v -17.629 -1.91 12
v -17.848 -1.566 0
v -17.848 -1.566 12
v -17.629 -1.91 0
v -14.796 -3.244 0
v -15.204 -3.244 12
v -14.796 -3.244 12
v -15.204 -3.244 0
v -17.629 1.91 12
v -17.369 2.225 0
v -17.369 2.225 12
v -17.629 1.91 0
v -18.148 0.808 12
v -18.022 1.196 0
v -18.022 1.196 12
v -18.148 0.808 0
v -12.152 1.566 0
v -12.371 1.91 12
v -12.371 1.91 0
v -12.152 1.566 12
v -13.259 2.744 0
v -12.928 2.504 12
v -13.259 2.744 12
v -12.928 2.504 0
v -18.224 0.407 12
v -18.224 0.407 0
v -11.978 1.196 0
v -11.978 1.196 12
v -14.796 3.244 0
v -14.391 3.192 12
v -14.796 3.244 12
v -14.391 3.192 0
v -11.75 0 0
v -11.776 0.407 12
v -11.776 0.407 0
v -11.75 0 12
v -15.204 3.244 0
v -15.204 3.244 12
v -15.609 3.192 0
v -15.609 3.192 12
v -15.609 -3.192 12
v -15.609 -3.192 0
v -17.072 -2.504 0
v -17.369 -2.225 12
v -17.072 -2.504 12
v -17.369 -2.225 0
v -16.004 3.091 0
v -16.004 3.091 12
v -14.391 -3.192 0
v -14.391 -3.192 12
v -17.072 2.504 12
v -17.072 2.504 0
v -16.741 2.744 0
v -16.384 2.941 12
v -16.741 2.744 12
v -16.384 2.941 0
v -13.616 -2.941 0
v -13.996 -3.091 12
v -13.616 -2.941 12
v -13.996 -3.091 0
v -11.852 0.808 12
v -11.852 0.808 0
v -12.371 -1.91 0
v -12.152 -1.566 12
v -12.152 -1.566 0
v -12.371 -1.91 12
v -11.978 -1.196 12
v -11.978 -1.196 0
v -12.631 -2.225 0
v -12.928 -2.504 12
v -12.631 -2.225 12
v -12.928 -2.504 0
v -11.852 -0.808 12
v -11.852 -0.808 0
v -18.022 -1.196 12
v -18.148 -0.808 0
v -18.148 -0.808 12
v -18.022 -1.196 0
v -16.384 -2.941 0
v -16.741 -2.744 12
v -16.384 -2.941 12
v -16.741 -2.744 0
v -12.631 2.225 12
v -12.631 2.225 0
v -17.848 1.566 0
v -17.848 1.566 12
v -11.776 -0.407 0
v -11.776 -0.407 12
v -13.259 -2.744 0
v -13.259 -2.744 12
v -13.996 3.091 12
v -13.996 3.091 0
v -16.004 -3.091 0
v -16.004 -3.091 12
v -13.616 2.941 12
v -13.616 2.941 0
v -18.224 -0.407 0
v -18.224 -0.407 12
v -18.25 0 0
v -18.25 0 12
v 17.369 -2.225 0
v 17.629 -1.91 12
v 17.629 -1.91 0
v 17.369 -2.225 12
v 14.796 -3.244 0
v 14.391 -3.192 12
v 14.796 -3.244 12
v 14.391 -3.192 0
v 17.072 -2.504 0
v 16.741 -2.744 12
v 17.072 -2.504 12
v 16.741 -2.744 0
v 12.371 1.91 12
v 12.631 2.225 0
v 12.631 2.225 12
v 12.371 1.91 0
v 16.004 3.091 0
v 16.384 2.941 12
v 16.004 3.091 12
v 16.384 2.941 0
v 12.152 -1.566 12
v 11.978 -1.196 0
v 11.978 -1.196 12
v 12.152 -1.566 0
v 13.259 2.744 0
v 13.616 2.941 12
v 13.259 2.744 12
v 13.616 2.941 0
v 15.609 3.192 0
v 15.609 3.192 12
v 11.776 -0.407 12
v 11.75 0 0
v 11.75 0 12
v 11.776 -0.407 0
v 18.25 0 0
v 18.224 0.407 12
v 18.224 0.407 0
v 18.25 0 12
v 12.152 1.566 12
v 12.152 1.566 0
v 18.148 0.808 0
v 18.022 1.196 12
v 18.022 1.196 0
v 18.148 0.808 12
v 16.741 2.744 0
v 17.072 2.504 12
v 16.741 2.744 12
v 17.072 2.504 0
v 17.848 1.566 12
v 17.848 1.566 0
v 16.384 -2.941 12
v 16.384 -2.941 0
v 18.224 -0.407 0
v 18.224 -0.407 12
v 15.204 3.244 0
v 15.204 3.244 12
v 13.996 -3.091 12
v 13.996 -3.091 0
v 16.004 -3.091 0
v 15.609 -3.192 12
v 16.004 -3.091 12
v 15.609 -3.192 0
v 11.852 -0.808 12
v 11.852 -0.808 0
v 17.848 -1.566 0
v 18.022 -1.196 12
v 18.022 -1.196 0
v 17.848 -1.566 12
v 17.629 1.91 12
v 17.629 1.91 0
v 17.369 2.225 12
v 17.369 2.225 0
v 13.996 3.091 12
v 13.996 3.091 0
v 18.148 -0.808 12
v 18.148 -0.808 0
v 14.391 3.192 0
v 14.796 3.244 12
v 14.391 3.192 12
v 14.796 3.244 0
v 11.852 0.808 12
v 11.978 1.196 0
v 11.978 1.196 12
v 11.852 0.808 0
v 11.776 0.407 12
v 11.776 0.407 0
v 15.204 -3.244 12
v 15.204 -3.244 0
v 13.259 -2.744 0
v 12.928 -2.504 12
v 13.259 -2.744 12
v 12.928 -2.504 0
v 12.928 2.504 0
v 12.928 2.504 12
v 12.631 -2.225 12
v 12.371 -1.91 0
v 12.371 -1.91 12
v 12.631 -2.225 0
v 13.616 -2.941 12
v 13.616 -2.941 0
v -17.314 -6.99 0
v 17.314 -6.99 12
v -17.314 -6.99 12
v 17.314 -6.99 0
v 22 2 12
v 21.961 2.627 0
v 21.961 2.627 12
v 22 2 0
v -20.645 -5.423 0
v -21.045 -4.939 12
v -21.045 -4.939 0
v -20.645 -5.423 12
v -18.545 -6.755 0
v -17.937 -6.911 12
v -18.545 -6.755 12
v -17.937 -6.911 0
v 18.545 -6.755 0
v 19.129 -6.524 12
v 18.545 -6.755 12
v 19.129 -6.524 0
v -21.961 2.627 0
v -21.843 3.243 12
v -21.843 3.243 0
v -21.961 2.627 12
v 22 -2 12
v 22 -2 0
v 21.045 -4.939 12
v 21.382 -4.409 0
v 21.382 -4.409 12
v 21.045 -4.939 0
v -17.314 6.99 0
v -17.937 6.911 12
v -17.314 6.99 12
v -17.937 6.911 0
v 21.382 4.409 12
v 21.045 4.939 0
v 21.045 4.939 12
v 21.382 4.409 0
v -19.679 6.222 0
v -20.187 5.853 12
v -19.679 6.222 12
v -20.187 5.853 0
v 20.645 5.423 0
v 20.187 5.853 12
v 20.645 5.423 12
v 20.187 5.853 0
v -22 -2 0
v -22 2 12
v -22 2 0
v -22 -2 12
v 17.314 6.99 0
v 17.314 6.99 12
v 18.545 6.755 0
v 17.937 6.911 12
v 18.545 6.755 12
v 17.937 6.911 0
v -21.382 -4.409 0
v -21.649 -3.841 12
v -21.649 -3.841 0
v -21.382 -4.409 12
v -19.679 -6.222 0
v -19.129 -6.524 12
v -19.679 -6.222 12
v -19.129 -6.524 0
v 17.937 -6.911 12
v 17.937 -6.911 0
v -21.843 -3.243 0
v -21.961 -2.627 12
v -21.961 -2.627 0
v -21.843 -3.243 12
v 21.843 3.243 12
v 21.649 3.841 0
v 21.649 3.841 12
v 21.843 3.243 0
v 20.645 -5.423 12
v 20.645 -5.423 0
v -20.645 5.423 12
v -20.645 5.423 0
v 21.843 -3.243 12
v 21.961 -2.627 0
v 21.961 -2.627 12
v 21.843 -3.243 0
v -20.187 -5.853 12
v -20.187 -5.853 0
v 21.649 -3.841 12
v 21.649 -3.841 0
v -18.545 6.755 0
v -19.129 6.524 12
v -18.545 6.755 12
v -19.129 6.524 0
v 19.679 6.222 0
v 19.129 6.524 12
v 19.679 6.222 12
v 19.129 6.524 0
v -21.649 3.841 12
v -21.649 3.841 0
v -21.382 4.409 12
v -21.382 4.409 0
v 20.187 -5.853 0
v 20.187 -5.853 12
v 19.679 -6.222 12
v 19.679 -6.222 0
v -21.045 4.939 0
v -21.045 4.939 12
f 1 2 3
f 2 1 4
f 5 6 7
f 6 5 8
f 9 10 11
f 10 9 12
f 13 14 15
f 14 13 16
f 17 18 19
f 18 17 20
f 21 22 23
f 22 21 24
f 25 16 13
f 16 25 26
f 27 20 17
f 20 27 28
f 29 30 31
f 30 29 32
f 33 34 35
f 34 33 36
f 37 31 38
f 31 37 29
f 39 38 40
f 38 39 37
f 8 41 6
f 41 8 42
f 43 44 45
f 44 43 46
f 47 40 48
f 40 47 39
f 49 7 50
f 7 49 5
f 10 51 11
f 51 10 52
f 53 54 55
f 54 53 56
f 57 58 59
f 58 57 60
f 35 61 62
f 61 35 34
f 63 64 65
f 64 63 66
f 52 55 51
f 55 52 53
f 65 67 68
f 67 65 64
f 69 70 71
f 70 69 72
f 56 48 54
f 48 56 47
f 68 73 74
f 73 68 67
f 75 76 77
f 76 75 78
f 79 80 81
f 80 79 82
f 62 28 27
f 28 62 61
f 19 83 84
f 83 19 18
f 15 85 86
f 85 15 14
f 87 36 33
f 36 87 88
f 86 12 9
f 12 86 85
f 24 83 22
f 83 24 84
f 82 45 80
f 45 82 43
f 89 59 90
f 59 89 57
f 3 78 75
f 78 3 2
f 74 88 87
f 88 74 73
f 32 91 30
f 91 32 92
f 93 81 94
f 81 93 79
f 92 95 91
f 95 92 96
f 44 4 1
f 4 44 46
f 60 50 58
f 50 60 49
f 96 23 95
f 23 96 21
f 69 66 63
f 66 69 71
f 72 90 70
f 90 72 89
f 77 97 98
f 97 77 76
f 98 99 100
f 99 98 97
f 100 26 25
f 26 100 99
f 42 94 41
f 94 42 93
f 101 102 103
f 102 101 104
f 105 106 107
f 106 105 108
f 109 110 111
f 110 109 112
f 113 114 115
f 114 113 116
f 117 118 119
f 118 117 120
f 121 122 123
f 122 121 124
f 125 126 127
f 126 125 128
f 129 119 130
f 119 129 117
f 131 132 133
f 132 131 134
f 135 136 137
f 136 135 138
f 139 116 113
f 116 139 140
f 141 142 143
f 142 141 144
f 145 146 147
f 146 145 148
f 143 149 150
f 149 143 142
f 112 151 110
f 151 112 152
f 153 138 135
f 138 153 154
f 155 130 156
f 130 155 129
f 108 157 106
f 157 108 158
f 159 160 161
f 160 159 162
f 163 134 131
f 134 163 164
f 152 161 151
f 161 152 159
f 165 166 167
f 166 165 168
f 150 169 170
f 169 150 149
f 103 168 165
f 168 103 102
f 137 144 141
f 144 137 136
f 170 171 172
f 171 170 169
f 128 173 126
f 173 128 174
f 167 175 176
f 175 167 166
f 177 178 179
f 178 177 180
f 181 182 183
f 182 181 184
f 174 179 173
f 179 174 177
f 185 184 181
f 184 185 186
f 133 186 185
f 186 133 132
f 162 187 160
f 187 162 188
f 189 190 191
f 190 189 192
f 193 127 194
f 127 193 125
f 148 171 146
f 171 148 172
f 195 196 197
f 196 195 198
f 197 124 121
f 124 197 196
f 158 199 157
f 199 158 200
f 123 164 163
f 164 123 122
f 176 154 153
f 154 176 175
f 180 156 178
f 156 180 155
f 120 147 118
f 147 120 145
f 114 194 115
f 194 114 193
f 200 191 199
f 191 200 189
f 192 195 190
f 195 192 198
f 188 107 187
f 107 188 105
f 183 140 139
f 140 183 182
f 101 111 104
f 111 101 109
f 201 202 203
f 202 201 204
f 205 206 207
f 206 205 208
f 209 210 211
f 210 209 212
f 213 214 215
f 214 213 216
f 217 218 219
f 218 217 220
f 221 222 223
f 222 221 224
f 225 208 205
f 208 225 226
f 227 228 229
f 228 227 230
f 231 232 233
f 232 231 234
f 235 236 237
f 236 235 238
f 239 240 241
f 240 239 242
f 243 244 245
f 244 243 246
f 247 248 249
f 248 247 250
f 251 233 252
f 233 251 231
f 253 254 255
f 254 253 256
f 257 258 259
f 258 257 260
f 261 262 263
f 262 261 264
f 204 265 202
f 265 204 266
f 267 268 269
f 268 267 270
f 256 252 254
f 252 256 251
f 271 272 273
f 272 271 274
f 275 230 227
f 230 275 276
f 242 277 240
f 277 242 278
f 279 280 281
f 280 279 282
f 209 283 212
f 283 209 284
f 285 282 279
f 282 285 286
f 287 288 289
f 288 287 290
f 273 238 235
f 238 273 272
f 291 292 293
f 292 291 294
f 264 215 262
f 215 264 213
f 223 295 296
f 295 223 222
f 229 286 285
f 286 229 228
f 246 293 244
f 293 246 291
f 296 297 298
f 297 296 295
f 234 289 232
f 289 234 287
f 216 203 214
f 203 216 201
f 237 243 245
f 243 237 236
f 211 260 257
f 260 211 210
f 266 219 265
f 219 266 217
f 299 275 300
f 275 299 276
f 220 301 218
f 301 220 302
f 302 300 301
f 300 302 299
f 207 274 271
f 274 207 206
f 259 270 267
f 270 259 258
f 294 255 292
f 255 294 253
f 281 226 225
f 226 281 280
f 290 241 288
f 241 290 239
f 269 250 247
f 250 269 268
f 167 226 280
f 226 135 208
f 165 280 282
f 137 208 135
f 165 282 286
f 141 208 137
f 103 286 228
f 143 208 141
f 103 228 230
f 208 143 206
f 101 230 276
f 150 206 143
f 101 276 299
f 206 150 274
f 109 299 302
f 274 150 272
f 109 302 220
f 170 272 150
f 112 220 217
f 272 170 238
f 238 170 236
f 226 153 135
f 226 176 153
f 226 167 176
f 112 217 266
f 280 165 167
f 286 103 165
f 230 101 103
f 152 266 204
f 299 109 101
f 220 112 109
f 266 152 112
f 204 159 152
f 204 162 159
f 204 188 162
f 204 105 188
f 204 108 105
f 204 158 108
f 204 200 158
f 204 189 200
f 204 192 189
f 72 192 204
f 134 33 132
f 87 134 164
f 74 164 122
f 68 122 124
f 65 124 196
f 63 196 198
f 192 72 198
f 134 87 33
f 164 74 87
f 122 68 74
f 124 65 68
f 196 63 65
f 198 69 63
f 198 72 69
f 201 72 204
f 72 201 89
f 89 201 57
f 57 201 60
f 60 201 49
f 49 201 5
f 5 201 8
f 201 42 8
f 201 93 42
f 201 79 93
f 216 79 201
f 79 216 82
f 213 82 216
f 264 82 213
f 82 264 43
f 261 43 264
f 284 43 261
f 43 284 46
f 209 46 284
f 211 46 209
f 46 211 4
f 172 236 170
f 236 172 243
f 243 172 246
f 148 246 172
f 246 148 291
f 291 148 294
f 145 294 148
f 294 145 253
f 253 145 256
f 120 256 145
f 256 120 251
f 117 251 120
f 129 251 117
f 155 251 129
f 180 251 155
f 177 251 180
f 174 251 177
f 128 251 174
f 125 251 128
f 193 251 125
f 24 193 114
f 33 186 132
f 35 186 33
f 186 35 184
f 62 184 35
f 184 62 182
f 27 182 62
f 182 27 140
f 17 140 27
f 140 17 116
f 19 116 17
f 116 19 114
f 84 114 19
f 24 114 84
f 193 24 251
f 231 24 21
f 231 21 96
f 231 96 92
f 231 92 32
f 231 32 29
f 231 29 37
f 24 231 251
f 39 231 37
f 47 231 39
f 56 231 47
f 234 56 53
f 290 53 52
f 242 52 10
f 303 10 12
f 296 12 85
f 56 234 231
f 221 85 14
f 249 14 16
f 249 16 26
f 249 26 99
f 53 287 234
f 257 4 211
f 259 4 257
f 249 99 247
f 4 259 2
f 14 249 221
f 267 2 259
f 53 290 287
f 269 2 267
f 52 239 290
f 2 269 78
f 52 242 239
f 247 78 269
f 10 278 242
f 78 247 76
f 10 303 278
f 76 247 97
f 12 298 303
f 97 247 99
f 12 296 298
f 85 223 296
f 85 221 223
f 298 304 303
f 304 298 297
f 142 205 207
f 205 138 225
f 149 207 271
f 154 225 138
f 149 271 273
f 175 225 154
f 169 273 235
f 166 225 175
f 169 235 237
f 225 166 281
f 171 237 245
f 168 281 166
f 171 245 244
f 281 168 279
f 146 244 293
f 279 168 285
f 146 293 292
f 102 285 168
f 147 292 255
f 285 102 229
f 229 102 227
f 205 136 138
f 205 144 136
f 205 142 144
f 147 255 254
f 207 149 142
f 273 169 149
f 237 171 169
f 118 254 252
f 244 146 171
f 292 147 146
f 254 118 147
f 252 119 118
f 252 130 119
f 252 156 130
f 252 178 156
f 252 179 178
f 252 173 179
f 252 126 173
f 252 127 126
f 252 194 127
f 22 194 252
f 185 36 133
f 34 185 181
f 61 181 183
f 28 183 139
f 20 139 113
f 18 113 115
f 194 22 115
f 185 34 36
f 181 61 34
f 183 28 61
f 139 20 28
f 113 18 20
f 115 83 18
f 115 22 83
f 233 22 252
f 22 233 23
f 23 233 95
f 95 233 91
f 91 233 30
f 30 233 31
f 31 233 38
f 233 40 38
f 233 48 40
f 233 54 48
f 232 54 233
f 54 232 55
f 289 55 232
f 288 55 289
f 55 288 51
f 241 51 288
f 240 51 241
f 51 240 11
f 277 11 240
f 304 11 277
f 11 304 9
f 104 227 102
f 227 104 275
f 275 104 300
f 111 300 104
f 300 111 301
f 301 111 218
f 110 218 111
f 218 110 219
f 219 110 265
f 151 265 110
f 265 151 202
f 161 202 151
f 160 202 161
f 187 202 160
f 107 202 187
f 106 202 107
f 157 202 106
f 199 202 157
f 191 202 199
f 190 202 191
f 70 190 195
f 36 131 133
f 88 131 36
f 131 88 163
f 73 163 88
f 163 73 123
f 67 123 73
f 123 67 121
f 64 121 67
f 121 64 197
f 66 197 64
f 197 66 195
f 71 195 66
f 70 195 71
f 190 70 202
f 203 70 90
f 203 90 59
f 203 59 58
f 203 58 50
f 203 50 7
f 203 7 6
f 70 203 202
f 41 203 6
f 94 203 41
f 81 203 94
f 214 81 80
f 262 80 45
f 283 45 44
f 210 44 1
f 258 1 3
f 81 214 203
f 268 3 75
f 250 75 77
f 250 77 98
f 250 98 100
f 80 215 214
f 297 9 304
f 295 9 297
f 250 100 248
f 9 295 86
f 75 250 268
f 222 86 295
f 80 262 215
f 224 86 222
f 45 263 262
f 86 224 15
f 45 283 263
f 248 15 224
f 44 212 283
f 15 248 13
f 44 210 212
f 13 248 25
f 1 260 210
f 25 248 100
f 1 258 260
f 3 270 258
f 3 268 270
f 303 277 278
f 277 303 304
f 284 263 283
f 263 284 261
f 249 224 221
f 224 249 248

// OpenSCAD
$fn = 50;


difference() {
	union() {
		hull() {
			translate(v = [-17.0000000000, 2.0000000000, 0]) {
				cylinder(h = 12, r = 5);
			}
			translate(v = [17.0000000000, 2.0000000000, 0]) {
				cylinder(h = 12, r = 5);
			}
			translate(v = [-17.0000000000, -2.0000000000, 0]) {
				cylinder(h = 12, r = 5);
			}
			translate(v = [17.0000000000, -2.0000000000, 0]) {
				cylinder(h = 12, r = 5);
			}
		}
	}
	union() {
		translate(v = [-15.0000000000, 0.0000000000, -100.0000000000]) {
			cylinder(h = 200, r = 3.2500000000);
		}
		translate(v = [-15.0000000000, 0.0000000000, -100.0000000000]) {
			cylinder(h = 200, r = 3.2500000000);
		}
		translate(v = [15.0000000000, 0.0000000000, -100.0000000000]) {
			cylinder(h = 200, r = 3.2500000000);
		}
		translate(v = [15.0000000000, 0.0000000000, -100.0000000000]) {
			cylinder(h = 200, r = 3.2500000000);
		}
	}
}
